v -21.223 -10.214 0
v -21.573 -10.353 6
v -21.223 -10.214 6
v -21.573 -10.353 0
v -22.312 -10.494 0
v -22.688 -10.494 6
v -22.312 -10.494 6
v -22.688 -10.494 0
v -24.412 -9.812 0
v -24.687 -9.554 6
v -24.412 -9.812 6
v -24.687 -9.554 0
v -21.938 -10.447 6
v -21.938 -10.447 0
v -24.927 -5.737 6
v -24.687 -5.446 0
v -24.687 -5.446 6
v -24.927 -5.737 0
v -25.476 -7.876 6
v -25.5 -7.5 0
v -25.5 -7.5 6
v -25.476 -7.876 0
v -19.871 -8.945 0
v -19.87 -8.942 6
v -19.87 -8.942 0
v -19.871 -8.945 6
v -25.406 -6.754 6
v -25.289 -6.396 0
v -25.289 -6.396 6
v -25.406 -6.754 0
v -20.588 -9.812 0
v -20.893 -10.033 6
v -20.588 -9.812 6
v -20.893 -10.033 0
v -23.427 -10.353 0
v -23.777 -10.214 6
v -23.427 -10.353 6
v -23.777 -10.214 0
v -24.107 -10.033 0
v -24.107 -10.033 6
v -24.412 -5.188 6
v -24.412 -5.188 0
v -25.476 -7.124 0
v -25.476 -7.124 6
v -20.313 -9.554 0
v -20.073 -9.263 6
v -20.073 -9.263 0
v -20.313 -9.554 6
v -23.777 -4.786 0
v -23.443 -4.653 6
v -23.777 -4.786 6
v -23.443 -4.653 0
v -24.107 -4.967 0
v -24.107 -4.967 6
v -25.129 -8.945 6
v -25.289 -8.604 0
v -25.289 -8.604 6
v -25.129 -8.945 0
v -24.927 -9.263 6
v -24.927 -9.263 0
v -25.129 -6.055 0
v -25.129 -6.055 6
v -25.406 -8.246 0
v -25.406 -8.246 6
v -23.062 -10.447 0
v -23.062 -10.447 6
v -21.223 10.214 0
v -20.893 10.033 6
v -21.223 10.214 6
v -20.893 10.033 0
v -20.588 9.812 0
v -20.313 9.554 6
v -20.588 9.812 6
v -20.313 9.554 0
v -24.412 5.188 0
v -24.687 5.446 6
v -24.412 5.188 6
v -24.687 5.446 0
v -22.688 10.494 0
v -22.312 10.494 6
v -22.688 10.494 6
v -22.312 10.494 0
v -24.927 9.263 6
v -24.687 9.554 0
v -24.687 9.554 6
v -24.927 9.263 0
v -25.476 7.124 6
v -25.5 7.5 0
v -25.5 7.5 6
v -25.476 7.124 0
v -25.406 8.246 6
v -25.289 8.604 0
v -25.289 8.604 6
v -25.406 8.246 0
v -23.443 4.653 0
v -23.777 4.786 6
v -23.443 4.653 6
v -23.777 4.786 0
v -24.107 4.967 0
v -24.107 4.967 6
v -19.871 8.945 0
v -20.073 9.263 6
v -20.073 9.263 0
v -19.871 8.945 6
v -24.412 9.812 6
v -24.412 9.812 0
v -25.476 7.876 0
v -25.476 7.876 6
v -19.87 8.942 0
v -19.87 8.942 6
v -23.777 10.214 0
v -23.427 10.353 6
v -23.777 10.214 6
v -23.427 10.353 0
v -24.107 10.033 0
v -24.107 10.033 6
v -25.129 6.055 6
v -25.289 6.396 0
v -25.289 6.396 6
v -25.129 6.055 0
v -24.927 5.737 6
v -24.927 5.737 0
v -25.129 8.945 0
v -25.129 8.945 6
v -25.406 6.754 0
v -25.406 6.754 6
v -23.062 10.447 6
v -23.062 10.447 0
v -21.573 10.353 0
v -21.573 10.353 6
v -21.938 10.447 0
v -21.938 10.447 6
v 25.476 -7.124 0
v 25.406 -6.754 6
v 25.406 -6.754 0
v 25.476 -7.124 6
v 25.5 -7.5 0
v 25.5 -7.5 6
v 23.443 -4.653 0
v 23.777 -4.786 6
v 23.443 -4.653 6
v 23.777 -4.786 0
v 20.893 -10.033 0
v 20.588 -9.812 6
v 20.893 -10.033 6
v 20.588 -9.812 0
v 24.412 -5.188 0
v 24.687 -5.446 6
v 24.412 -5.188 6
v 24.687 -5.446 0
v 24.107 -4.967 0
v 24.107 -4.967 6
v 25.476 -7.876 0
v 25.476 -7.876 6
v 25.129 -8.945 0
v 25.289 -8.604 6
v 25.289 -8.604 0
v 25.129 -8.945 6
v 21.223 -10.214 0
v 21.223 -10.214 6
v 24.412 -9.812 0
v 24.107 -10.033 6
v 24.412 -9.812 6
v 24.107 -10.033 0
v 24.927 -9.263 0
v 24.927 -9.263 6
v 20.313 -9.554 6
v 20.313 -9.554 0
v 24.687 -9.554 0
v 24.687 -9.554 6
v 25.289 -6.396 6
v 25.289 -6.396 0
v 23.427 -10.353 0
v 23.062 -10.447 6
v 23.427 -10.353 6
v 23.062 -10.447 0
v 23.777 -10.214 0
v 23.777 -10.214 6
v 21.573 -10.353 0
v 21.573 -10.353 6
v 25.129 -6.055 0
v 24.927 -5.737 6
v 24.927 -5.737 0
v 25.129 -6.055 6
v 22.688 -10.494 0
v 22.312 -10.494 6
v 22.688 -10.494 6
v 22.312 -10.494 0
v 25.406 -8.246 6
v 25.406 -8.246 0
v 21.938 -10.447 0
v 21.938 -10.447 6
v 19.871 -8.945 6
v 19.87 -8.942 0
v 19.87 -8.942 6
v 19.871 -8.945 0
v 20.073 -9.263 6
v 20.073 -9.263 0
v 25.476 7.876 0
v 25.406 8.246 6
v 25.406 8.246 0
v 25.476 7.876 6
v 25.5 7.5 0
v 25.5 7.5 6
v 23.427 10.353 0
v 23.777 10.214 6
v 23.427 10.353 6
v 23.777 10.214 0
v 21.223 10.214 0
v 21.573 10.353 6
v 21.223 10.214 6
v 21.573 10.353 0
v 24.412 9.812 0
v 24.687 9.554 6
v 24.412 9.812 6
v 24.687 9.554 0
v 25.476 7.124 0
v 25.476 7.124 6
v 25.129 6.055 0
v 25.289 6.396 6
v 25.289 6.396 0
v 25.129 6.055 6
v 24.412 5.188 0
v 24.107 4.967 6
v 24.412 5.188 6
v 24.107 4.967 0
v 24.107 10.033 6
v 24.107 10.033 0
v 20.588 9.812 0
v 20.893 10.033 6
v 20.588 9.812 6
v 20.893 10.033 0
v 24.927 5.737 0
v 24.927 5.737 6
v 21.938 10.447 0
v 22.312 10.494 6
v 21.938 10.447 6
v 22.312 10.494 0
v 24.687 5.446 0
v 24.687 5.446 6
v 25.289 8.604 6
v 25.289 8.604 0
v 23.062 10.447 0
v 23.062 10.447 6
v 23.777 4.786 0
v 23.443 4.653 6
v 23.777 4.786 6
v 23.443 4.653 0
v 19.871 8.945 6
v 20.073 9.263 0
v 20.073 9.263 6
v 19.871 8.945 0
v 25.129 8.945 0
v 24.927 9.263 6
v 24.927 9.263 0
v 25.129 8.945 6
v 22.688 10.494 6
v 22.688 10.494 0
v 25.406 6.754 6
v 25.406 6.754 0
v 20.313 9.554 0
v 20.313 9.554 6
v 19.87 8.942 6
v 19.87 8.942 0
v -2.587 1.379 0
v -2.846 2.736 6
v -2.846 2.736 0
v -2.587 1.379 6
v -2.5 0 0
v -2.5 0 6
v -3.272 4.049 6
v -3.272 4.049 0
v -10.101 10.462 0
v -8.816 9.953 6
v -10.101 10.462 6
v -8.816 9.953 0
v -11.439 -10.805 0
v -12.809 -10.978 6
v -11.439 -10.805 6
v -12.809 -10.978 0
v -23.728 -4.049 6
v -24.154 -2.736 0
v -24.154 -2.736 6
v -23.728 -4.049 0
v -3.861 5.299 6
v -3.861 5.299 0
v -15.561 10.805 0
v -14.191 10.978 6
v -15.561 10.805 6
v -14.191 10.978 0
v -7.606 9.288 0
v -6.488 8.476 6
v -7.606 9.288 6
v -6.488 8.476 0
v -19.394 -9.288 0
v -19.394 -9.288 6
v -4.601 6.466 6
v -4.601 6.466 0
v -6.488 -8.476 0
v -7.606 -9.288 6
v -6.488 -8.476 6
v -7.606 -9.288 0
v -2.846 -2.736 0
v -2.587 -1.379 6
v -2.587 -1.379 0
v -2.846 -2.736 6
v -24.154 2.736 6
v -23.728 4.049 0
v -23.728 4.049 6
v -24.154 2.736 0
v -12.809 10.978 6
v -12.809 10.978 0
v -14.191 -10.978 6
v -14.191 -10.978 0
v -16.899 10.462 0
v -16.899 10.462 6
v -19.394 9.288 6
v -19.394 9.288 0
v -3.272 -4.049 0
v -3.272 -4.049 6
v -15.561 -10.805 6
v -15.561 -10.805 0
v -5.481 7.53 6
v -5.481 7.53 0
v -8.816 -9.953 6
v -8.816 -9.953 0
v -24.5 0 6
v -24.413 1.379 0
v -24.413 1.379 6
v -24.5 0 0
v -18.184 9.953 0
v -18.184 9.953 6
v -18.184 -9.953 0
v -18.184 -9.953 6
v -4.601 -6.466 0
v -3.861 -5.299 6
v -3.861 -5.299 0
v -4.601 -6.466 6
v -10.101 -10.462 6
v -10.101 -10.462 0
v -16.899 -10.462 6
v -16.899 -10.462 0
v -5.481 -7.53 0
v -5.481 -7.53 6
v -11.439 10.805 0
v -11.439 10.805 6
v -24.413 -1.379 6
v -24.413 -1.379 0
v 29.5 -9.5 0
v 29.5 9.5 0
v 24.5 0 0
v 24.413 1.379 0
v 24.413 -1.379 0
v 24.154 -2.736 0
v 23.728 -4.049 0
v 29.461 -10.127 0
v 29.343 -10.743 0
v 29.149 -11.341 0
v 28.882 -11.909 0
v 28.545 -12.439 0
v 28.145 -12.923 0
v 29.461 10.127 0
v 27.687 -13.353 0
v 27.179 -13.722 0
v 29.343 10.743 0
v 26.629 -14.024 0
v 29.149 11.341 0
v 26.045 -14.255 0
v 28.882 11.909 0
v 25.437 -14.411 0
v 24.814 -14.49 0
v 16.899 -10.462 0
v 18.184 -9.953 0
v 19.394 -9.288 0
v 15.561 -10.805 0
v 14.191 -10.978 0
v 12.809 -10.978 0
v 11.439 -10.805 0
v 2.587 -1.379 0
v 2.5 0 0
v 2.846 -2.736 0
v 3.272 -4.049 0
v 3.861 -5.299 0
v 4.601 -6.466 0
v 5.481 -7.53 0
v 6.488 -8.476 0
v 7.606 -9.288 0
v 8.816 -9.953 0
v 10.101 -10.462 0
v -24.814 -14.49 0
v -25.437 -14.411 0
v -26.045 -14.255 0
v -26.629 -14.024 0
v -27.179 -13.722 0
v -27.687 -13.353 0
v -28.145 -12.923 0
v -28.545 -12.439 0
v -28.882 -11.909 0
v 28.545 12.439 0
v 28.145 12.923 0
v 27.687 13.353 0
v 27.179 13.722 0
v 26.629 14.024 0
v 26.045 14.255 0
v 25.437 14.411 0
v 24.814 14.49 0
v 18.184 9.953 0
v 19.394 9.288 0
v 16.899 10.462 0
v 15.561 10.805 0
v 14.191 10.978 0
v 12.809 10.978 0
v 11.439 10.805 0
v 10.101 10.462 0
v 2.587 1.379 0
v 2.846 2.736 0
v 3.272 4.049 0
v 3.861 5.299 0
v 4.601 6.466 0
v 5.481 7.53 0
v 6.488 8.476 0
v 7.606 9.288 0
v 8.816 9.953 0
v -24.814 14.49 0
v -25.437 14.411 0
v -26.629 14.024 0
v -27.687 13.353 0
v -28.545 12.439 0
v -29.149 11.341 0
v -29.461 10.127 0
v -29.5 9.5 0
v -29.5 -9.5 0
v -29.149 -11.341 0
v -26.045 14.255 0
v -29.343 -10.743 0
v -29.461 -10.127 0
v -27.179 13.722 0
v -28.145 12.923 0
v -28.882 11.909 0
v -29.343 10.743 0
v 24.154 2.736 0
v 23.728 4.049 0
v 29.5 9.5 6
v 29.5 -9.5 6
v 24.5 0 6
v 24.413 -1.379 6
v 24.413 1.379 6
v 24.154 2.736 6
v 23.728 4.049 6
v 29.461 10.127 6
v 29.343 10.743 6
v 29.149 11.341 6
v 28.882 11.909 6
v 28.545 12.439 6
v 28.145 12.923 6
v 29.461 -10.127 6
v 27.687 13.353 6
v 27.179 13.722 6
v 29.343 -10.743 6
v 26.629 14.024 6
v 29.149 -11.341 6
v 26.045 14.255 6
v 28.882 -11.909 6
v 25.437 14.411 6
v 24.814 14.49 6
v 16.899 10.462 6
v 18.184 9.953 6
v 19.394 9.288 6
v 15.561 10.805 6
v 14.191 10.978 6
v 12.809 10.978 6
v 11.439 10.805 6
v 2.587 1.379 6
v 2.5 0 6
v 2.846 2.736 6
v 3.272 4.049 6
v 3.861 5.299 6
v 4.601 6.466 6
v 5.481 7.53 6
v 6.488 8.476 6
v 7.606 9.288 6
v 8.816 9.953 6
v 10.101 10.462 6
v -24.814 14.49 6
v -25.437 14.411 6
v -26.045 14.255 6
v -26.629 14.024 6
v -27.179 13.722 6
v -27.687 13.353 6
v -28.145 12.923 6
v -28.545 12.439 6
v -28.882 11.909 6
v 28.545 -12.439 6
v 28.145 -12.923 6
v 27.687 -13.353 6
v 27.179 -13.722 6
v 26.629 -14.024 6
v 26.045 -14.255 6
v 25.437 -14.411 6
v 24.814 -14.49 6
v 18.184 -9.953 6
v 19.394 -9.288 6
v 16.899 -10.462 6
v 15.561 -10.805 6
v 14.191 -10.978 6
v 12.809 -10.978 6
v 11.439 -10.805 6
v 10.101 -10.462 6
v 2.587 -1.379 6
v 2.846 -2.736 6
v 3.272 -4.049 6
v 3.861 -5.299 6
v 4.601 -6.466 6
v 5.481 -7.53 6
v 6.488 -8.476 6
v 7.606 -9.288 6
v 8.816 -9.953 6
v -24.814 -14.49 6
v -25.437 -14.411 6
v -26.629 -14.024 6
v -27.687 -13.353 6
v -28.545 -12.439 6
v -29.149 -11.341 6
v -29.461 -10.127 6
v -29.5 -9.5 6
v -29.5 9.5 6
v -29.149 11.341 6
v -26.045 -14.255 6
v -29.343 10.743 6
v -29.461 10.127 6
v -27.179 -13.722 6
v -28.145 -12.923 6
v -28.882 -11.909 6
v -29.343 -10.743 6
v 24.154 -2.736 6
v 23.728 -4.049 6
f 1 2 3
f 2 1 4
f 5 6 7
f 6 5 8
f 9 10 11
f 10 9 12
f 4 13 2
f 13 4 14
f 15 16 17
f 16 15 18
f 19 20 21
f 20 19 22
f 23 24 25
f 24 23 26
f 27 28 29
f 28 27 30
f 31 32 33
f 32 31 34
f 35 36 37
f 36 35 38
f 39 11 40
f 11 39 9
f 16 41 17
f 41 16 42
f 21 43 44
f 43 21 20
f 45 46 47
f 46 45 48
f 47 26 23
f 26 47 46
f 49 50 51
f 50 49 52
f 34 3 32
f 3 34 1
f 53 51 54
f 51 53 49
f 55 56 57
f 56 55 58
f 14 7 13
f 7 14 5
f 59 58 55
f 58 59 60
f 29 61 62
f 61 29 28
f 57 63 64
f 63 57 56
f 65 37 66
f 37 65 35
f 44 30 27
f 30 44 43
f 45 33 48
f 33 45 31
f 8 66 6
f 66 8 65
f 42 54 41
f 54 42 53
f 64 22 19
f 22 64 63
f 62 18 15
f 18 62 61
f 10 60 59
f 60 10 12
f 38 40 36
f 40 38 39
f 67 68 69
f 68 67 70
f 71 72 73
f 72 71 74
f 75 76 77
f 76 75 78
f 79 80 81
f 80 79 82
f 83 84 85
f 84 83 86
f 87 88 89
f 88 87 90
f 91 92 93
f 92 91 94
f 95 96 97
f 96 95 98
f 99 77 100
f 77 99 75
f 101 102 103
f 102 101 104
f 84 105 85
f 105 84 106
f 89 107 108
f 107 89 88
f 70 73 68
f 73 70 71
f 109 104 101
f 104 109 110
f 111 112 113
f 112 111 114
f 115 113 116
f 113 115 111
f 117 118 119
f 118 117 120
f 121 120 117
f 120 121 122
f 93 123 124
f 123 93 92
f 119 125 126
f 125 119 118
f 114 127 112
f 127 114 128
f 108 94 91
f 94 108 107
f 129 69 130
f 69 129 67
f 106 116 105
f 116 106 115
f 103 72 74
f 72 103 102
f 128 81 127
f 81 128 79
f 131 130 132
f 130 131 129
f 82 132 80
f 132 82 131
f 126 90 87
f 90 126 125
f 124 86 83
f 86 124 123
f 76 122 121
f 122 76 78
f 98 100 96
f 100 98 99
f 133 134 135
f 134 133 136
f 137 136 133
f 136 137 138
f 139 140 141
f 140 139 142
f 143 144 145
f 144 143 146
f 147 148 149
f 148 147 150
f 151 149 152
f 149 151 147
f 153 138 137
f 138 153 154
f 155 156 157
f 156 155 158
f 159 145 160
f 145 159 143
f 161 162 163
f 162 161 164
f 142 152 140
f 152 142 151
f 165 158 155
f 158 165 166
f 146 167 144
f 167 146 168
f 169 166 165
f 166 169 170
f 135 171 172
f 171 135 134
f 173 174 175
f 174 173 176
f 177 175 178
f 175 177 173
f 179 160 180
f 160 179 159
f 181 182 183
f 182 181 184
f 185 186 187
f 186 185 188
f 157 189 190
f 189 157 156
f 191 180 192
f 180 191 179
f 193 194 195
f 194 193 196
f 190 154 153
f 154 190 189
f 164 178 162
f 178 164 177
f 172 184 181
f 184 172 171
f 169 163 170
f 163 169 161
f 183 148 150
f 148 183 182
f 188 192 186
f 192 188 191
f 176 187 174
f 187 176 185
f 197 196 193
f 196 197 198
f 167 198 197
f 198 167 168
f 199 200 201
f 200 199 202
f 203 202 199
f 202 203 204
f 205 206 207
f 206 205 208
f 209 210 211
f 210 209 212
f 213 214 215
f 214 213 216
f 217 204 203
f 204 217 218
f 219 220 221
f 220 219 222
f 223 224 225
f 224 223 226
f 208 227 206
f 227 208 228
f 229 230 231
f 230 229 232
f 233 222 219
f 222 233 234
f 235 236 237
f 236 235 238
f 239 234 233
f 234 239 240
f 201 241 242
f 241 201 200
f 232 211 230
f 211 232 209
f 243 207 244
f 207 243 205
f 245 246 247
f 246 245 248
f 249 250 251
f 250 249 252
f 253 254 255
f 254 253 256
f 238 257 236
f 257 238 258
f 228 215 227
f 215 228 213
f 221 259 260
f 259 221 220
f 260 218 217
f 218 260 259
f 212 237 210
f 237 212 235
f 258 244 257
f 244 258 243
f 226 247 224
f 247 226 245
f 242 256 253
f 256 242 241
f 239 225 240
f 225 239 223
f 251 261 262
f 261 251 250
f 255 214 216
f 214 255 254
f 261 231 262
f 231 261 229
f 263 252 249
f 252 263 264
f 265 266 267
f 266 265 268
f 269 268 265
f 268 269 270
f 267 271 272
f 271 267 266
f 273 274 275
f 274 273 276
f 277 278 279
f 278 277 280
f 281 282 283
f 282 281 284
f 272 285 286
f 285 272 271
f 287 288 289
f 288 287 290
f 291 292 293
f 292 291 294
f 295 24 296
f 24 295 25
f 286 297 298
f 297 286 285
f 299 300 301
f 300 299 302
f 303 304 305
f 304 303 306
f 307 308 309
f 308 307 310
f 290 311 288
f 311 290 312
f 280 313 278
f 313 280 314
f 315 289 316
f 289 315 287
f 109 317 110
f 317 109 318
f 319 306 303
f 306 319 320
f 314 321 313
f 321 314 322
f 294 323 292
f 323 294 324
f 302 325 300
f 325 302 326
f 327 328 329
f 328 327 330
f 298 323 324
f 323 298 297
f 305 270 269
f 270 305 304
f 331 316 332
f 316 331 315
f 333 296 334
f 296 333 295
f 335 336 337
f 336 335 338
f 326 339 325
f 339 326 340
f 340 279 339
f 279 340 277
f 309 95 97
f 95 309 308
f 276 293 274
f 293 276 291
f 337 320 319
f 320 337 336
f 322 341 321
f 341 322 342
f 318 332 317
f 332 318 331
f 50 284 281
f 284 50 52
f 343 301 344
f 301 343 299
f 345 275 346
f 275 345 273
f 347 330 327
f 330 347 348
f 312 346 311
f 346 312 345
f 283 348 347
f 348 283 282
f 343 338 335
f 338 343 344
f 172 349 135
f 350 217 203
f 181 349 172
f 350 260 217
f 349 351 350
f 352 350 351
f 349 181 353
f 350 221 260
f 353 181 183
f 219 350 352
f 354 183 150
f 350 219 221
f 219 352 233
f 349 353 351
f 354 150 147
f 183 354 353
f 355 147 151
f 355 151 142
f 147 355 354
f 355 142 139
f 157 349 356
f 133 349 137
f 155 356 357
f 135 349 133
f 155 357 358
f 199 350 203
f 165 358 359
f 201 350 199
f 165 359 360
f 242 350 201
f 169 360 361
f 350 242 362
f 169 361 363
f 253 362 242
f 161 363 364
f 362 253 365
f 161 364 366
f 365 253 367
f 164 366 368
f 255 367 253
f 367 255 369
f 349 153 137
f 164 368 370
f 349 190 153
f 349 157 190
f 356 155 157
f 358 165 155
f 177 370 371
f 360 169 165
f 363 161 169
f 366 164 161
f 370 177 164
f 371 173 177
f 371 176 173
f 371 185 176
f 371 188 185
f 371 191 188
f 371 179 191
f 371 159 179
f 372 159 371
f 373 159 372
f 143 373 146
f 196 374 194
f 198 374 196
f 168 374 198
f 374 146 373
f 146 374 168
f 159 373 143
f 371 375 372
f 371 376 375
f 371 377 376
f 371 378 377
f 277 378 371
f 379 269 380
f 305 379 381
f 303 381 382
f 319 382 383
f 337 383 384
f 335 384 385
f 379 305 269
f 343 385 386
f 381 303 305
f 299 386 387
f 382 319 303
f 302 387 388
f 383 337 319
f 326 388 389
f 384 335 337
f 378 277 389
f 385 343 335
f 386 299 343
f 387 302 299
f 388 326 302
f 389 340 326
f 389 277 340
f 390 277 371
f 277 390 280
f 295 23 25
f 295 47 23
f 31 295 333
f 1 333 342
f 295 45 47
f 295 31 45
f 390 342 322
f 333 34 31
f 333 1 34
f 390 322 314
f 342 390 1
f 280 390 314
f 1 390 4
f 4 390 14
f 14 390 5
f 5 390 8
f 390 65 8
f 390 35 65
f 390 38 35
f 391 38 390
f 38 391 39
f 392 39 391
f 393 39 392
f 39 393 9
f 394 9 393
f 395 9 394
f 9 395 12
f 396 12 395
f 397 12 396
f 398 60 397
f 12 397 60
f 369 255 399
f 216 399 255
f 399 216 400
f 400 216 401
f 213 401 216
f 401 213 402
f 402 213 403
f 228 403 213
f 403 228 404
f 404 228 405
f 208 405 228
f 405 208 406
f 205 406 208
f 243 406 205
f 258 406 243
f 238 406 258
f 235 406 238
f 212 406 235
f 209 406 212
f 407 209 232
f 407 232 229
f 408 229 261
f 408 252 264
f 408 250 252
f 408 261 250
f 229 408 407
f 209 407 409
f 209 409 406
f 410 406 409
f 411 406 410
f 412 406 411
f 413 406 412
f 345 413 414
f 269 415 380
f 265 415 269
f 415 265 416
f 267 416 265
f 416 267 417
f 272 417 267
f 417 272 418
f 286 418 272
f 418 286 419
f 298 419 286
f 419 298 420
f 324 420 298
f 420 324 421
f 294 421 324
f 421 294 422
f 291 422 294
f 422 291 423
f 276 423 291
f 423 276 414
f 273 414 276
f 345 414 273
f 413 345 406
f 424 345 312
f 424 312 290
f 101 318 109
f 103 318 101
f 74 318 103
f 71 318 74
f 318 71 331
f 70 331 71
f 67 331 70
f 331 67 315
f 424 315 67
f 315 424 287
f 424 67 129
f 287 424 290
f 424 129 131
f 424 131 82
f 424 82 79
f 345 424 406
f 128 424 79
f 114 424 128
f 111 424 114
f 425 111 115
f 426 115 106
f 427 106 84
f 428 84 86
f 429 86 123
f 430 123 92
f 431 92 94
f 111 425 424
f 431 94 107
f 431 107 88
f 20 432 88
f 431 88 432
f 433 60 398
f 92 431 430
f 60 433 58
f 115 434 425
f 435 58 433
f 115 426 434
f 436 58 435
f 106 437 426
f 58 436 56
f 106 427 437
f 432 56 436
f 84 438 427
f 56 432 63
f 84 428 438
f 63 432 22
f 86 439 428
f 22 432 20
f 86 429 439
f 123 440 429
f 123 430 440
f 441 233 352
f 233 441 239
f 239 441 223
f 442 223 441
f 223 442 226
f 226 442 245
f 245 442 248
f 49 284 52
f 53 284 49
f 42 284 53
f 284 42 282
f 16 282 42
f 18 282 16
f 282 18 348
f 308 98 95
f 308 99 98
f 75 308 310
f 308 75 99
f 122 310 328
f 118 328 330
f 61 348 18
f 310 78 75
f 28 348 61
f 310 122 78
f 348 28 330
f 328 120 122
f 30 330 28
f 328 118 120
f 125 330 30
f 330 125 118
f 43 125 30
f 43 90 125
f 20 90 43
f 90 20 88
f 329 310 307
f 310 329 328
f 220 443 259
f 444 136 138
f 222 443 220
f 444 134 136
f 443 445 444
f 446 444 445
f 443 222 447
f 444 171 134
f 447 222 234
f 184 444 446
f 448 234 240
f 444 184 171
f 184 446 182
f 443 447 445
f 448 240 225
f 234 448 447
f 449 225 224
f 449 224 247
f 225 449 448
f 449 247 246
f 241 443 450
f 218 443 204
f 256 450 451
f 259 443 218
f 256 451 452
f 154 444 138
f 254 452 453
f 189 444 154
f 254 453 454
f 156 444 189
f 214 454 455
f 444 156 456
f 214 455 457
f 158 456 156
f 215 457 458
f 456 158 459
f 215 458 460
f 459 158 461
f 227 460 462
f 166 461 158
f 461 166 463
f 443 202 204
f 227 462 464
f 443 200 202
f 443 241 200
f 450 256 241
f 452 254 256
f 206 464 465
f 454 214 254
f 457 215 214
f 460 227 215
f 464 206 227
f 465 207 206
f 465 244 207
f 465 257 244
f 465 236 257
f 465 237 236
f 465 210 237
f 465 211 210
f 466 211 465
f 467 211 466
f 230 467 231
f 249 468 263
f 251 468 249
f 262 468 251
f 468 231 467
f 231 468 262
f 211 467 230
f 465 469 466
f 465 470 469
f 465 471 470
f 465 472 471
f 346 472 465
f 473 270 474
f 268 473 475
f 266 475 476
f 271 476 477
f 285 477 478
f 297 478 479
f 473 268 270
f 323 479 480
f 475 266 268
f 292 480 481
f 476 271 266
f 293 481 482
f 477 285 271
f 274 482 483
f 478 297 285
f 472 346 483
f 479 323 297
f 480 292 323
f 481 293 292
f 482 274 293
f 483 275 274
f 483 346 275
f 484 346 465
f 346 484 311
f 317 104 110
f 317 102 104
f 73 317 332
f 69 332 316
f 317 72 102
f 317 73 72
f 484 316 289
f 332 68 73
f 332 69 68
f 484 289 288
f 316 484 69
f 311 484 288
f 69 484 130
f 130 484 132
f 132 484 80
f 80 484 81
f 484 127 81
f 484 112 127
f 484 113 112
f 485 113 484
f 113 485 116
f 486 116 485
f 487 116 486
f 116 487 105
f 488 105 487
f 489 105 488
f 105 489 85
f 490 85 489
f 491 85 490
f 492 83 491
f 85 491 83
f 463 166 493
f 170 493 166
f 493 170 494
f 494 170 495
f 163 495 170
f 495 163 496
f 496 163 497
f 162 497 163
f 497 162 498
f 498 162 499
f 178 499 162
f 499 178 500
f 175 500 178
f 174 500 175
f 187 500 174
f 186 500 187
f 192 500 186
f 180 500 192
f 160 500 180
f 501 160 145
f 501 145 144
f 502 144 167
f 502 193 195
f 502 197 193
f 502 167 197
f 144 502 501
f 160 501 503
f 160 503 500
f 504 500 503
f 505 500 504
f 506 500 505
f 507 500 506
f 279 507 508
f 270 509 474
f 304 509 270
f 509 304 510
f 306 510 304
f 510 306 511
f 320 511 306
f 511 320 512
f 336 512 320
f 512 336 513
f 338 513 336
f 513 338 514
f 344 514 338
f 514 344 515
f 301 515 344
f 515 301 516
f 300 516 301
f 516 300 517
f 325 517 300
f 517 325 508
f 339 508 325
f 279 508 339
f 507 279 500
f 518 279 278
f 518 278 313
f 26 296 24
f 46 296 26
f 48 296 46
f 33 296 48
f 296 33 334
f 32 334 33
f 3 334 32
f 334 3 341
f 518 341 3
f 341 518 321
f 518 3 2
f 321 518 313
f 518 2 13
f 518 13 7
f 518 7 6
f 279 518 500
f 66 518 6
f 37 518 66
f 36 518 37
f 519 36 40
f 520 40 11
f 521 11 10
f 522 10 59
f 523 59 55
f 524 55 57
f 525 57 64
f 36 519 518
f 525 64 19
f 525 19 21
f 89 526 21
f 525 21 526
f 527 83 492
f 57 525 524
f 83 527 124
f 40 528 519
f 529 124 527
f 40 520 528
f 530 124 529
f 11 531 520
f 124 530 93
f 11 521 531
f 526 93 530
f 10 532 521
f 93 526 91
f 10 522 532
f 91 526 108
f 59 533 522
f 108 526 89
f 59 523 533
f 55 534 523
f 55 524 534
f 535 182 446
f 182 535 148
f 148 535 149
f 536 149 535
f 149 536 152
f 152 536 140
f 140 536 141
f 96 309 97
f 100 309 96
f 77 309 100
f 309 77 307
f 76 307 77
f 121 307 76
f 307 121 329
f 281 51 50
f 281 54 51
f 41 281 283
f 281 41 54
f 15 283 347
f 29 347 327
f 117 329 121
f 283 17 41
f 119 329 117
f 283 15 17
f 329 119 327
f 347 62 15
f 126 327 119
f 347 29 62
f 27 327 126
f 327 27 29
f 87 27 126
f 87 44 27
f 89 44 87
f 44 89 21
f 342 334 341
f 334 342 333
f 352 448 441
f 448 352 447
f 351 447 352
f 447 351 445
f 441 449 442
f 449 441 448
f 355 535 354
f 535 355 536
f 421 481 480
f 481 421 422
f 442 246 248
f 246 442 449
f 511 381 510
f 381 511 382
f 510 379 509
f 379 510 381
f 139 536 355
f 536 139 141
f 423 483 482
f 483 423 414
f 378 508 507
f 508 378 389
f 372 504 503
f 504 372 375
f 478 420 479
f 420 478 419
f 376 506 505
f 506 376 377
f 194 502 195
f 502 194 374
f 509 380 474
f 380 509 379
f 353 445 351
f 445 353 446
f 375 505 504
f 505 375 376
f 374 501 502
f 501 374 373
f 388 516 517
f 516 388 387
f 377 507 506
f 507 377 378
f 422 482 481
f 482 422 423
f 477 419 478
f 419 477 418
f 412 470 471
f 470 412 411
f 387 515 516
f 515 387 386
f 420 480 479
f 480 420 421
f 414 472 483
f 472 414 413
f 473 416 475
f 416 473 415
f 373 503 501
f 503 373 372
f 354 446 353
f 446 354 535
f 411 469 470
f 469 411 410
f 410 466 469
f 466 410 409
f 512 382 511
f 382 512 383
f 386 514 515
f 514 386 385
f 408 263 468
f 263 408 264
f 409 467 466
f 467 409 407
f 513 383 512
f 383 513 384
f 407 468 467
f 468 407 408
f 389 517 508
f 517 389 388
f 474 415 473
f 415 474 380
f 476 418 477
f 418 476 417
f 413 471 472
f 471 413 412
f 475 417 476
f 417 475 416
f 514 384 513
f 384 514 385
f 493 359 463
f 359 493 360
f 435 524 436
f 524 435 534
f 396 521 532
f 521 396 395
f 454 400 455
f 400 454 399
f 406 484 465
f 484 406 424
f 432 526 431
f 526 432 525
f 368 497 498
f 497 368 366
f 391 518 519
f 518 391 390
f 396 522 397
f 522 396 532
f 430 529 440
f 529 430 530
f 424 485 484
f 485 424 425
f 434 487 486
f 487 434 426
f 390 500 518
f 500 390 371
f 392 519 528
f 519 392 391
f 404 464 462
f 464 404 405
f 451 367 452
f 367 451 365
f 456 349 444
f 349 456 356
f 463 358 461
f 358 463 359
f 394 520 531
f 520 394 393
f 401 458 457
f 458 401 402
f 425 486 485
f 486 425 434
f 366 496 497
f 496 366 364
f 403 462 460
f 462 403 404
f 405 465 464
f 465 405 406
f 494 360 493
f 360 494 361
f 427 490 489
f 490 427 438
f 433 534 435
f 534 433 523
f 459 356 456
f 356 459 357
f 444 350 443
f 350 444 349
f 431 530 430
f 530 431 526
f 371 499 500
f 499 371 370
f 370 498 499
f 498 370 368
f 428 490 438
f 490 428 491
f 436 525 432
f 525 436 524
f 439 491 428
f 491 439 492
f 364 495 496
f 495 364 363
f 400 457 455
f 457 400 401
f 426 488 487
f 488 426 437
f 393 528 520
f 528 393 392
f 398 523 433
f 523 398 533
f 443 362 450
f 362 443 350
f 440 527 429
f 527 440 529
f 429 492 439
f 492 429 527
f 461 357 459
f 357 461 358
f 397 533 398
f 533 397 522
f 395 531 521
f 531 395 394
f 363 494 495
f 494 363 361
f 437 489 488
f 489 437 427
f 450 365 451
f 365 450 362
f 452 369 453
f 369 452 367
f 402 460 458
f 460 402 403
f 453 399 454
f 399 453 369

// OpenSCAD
$fn = 50;


difference() {
	union() {
		hull() {
			translate(v = [-24.5000000000, 9.5000000000, 0]) {
				cylinder(h = 6, r = 5);
			}
			translate(v = [24.5000000000, 9.5000000000, 0]) {
				cylinder(h = 6, r = 5);
			}
			translate(v = [-24.5000000000, -9.5000000000, 0]) {
				cylinder(h = 6, r = 5);
			}
			translate(v = [24.5000000000, -9.5000000000, 0]) {
				cylinder(h = 6, r = 5);
			}
		}
	}
	union() {
		#translate(v = [-22.5000000000, -7.5000000000, -100.0000000000]) {
			cylinder(h = 200, r = 3.0000000000);
		}
		#translate(v = [-22.5000000000, 7.5000000000, -100.0000000000]) {
			cylinder(h = 200, r = 3.0000000000);
		}
		#translate(v = [22.5000000000, -7.5000000000, -100.0000000000]) {
			cylinder(h = 200, r = 3.0000000000);
		}
		#translate(v = [22.5000000000, 7.5000000000, -100.0000000000]) {
			cylinder(h = 200, r = 3.0000000000);
		}
		#translate(v = [-13.5000000000, 0, 0]) {
			cylinder(h = 6, r = 11.0000000000);
		}
		#translate(v = [13.5000000000, 0, 0]) {
			cylinder(h = 6, r = 11.0000000000);
		}
	}
}
